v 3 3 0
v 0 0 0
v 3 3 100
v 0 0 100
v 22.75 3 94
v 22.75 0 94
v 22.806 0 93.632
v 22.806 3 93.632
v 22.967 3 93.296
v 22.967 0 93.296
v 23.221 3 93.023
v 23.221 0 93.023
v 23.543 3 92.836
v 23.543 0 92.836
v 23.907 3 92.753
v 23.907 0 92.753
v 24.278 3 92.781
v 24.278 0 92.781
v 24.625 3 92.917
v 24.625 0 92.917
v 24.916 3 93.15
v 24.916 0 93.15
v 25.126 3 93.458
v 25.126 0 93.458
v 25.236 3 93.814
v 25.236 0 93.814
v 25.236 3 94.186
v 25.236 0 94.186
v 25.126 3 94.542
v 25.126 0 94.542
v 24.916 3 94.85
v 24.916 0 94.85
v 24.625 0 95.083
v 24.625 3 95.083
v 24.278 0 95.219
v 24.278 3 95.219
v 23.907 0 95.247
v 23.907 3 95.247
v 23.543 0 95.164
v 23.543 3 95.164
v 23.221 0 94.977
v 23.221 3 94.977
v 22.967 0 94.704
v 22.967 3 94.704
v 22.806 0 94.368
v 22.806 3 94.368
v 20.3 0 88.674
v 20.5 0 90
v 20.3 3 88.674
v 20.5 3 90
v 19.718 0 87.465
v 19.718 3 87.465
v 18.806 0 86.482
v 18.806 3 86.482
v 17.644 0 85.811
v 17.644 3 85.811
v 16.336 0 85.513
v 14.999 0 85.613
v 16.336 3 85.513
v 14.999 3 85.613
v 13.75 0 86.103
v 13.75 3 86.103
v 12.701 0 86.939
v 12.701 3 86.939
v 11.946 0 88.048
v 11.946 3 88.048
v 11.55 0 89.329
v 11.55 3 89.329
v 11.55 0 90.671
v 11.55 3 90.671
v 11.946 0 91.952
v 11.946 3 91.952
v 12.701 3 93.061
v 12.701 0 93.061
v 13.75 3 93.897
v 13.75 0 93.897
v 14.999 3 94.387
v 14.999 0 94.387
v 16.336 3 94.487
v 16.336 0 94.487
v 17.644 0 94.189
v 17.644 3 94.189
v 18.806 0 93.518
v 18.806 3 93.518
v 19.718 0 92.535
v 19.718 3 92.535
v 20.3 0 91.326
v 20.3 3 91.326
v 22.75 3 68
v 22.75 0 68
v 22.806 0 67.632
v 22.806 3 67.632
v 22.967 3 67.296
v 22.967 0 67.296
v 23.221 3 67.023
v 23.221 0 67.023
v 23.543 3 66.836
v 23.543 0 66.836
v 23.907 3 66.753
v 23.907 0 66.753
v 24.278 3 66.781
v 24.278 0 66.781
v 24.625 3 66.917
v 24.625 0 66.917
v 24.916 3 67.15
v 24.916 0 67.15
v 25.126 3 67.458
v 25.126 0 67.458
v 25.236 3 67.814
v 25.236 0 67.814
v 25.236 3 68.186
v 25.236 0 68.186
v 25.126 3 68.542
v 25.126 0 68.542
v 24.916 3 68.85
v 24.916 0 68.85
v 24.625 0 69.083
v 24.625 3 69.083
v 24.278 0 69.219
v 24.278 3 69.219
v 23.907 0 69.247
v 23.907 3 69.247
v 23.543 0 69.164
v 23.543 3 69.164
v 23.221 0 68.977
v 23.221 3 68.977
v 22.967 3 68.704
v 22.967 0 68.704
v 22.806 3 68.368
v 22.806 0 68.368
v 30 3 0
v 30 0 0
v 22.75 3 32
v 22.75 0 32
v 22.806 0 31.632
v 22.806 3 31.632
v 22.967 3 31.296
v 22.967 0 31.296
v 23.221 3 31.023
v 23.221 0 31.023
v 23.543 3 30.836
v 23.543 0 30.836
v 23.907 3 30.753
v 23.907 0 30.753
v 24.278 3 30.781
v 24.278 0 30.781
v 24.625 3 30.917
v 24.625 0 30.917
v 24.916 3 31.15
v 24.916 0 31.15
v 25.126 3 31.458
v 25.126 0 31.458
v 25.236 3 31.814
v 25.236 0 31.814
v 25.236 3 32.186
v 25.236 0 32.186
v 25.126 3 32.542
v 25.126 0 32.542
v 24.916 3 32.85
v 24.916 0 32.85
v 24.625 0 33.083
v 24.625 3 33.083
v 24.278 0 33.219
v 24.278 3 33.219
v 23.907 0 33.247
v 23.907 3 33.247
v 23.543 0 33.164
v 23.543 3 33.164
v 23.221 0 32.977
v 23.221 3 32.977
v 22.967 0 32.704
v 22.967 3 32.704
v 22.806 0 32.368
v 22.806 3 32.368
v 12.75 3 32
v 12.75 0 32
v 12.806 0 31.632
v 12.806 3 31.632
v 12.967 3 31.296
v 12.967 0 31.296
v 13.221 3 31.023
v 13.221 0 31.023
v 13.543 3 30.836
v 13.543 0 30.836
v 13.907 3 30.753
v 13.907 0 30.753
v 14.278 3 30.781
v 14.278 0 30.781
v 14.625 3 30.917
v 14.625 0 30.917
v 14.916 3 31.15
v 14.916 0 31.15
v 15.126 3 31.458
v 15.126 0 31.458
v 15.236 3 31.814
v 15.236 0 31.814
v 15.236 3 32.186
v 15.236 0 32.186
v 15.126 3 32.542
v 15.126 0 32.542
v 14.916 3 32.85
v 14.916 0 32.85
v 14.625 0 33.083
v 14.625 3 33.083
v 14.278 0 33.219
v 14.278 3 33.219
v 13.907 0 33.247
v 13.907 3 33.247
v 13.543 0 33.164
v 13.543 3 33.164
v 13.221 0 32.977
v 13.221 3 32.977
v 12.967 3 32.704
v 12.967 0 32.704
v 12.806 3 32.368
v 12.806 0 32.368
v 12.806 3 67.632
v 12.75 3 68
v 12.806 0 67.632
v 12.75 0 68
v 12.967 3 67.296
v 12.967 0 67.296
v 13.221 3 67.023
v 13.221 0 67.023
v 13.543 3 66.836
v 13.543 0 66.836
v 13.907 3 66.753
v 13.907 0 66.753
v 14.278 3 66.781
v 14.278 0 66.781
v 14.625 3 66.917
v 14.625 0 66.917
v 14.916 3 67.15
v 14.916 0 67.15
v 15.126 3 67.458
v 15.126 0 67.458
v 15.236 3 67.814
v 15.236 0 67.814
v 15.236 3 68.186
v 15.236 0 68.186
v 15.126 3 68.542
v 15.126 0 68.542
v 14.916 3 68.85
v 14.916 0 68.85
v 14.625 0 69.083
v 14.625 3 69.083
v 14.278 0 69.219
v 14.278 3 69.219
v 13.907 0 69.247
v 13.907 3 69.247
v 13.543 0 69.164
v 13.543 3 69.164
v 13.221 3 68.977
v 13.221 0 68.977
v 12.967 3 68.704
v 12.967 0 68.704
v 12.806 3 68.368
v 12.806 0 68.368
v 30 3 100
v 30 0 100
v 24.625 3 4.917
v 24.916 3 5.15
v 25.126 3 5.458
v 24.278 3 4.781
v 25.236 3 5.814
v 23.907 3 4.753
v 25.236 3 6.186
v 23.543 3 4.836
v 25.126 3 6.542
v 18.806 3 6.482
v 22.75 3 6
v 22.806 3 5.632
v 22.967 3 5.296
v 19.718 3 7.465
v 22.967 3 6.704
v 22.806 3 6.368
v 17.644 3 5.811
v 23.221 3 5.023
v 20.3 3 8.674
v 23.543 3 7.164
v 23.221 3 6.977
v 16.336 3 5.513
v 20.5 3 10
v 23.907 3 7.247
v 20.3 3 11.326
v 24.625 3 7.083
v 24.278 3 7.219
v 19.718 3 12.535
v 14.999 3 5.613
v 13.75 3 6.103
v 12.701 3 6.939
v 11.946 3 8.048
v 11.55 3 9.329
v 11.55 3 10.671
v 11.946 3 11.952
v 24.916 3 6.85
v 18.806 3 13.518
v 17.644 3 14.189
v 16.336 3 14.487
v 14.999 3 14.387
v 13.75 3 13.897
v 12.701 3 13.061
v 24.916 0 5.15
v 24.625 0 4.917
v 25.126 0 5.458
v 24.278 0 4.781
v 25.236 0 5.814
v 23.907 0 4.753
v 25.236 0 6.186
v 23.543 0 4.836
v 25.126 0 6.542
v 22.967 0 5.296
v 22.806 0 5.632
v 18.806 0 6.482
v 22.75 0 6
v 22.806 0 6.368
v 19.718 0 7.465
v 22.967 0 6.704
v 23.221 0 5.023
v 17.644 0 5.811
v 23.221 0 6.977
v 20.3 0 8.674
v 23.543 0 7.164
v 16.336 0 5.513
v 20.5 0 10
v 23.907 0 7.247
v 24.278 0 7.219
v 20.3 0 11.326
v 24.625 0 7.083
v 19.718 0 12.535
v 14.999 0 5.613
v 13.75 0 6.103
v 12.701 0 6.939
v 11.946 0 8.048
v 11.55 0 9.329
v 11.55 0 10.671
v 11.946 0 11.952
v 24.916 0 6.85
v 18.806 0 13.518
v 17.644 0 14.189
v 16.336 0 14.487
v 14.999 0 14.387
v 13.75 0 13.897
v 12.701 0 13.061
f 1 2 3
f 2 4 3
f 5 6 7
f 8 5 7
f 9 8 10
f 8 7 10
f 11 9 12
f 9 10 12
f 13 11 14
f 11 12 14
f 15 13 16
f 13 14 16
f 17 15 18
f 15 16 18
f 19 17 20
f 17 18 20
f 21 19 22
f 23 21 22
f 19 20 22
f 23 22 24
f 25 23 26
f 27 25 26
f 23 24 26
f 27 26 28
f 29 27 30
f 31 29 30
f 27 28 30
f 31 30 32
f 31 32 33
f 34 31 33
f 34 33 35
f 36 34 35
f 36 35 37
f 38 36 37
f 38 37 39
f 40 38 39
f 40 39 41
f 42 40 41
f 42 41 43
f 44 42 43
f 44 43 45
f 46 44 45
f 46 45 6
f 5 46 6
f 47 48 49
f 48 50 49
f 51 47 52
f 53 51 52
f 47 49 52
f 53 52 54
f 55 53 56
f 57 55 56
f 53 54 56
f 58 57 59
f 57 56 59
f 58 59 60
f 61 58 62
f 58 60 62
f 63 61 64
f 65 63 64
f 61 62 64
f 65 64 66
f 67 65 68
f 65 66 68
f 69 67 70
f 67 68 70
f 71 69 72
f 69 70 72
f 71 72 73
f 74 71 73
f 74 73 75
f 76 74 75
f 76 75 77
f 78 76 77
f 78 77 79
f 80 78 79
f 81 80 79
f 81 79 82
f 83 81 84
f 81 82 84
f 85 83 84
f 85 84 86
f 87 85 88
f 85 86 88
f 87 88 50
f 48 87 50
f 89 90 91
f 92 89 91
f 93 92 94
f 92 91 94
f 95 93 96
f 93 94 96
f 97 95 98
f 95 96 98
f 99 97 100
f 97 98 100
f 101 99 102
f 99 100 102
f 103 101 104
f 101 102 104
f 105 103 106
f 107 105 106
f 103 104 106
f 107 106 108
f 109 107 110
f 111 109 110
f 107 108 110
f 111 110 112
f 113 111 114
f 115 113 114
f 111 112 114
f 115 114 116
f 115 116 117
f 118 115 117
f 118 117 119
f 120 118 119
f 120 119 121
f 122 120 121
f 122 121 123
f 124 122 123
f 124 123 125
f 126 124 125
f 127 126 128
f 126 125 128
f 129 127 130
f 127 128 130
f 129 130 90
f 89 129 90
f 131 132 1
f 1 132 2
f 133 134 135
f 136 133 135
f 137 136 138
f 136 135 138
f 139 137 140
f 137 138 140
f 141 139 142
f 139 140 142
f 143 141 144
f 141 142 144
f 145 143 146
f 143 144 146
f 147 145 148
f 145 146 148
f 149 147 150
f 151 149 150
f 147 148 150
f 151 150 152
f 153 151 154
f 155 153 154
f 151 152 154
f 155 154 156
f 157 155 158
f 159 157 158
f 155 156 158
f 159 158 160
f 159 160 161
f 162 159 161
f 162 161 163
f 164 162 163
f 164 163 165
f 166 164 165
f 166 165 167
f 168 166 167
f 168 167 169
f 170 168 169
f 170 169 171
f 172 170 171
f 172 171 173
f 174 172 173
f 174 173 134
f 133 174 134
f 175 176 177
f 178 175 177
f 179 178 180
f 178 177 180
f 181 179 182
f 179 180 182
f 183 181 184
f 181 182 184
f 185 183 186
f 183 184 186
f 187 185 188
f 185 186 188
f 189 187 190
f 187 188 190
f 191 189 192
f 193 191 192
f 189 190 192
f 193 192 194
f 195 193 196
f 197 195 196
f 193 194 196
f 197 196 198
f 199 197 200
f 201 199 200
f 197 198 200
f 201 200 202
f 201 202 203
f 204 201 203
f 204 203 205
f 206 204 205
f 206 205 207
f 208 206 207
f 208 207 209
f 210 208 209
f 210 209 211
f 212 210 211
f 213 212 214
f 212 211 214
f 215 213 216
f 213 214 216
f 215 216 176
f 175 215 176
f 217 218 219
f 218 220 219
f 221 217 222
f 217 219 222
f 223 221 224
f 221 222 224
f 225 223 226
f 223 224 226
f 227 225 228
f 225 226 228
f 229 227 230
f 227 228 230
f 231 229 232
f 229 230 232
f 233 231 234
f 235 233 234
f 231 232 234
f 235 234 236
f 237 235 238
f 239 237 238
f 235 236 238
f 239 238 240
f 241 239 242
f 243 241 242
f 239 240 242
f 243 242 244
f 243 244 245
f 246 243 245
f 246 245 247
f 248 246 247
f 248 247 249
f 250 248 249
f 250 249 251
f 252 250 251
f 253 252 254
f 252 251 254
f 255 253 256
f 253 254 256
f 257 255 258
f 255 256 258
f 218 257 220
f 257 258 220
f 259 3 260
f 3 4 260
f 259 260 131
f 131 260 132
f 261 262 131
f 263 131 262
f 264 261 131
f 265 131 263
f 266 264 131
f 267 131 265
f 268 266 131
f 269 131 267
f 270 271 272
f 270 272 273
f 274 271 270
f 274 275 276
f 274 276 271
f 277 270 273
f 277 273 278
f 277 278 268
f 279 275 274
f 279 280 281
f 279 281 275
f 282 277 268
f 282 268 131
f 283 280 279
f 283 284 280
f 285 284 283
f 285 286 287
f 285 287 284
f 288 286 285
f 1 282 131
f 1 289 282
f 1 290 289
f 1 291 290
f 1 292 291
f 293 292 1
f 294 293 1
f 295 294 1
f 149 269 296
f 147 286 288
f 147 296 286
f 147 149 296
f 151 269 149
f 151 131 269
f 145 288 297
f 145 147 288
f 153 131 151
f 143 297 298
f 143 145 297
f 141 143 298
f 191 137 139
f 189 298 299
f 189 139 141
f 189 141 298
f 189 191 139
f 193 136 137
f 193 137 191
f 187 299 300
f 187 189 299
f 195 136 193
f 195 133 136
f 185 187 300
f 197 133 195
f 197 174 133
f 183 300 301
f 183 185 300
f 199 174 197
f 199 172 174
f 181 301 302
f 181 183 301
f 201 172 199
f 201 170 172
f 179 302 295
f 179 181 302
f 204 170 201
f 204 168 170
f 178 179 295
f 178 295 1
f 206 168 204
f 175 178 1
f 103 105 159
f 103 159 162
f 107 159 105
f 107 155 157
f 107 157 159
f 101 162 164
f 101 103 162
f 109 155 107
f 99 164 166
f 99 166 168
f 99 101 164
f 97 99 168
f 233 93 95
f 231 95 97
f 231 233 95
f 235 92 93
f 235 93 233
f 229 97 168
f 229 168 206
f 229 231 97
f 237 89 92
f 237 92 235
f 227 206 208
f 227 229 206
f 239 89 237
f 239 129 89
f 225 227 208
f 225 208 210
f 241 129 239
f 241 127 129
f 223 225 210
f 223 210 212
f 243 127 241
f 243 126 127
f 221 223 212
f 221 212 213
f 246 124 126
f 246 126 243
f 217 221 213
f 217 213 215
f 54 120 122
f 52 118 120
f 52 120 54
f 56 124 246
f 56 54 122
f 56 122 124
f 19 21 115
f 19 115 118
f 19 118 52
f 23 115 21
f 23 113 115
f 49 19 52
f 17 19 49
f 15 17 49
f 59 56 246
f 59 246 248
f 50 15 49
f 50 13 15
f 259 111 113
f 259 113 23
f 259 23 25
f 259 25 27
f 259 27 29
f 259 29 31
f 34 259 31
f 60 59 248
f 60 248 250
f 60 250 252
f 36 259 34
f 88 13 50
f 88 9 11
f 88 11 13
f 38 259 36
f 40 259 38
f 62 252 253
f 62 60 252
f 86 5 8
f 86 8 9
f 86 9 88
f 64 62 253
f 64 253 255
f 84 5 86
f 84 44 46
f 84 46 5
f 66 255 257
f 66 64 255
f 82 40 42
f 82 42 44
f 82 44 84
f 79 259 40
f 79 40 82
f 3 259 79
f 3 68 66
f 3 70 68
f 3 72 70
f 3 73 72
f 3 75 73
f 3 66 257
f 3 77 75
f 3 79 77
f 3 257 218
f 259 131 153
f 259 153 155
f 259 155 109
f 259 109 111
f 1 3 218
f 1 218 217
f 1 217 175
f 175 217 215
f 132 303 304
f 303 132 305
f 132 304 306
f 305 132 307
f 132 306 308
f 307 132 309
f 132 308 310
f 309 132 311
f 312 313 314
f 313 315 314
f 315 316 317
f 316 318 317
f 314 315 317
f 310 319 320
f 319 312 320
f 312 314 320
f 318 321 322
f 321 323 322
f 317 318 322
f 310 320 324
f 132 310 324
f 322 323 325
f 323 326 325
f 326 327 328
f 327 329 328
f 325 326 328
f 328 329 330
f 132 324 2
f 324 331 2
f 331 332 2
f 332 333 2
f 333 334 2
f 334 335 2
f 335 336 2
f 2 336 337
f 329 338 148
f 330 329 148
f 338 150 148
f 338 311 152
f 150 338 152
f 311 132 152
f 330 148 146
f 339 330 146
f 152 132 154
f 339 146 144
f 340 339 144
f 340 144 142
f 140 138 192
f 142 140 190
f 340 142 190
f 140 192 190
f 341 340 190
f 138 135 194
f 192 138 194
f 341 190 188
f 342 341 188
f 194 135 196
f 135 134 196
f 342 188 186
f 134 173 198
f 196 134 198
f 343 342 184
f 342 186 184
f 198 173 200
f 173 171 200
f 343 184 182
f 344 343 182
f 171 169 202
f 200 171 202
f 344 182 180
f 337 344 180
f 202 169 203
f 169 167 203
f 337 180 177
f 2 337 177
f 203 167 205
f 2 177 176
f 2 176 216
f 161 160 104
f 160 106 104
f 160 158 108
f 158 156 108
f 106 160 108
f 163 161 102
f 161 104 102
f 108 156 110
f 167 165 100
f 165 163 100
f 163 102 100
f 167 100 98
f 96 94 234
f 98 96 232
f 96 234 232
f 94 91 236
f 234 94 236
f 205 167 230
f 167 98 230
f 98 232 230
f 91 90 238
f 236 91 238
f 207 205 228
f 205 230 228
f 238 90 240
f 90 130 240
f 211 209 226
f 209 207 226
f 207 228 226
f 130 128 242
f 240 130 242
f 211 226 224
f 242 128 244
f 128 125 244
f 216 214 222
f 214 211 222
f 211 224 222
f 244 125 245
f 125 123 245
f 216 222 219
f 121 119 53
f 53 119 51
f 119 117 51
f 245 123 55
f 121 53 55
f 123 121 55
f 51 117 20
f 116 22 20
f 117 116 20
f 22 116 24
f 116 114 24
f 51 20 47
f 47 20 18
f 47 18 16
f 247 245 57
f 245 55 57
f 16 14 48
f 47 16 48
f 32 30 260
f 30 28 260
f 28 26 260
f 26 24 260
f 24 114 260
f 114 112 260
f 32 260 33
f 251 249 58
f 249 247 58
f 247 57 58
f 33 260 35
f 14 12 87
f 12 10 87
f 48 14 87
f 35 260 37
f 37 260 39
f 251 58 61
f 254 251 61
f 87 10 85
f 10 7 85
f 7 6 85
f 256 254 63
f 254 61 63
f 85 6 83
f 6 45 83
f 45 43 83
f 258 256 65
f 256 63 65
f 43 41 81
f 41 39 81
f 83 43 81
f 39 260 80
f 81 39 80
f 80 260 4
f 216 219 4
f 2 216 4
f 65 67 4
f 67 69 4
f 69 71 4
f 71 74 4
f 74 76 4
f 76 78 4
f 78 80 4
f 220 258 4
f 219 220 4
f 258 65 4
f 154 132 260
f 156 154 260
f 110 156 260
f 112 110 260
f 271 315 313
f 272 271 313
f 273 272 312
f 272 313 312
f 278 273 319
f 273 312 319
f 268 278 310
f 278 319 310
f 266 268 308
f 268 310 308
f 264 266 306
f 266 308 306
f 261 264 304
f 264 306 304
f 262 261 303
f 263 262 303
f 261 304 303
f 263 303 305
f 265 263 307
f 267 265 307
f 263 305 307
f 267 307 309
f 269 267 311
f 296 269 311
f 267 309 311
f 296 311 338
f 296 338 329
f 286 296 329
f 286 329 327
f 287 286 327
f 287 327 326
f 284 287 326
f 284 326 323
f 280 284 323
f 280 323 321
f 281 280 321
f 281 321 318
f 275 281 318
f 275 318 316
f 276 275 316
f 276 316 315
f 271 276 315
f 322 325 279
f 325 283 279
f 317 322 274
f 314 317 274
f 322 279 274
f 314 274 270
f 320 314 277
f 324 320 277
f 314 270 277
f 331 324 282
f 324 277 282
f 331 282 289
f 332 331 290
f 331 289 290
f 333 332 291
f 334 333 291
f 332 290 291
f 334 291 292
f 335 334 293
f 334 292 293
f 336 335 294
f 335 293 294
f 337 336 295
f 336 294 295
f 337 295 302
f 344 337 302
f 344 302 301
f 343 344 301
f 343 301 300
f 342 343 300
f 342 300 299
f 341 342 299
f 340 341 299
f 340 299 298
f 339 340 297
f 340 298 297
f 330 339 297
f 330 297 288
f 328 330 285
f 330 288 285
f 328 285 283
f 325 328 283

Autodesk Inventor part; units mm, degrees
ref_plane "YZ Plane" through (0, 0, 0) normal (1, 0, 0) x (0, 1, 0)
ref_plane "XZ Plane" through (0, 0, 0) normal (0, 1, 0) x (-1, 0, 0)
ref_plane "XY Plane" through (0, 0, 0) normal (0, 0, 1) x (1, 0, 0)
sketch "Sketch1" plane through (0, 0, 0) normal (0, 1, 0) x (-1, 0, 0)
  line L0 (0, 100) -> (-30, 100)
  line L1 (-30, 100) -> (-30, 0)
  line L2 (-30, 0) -> (0, 0)
  line L3 (0, 0) -> (0, 100)
  circle A0 centre (-24, 94) radius 1.25
  circle A1 centre (-24, 68) radius 1.25
  circle A2 centre (-14, 68) radius 1.25
  line L4 (-30, 50) -> (0, 50) construction
  circle A3 centre (-24, 6) radius 1.25
  circle A4 centre (-24, 32) radius 1.25
  circle A5 centre (-14, 32) radius 1.25
  circle A6 centre (-16, 90) radius 4.5
  circle A7 centre (-16, 10) radius 4.5
  dimension "d0" = 30
  dimension "d1" = 100
  dimension "d7" = 2.5
  dimension "d8" = 6
  dimension "d9" = 6
  dimension "d10" = 2.5
  dimension "d12" = 2.5
  dimension "d13" = 10
  dimension "d16" = 32
  dimension "d23" = 9
  dimension "d24" = 10
  dimension "d25" = 14
extrude "Extrusion1" add sketch "Sketch1" along normal blind 3 contours L3 L2 L1 L0 | A0 | A1 | A2 | A3 | A4 | A5 | A6 | A7
sketch "Sketch2" plane through (0, 0, 100) normal (0, 0, 1) x (1, 0, 0)
  line L0 (0, 0) -> (0, 3) projected
  line L1 (0, 0) -> (3, 3)
  line L2 (0, 3) -> (30, 3) projected
  line L3 (0, 3) -> (0, 0)
  dimension "d4" = 3
extrude "Extrusion2" cut sketch "Sketch2" against normal through all
extrude "Extrusion3" cut sketch "Sketch1" along normal through all contours A0 | A1 | A2 | A3 | A4 | A5
sketch "Sketch3" plane through (0, 3, 0) normal (0, 1, 0) x (1, 0, 0)
  circle A0 centre (16, -10) radius 4.5
  line L0 (3, 0) -> (3, -100) projected
  line L1 (30, 0) -> (3, 0) projected
  line L2 (3, -50) -> (16, -50) construction
  circle A1 centre (16, -90) radius 4.5
  line L3 (30, -100) -> (30, 0) projected
  point P0 (0, 0)
  dimension "d18" = 10
  dimension "d19" = 9
  dimension "d22" = 14
extrude "Extrusion4" cut sketch "Sketch3" against normal through all
properties part number "Ostrze"
